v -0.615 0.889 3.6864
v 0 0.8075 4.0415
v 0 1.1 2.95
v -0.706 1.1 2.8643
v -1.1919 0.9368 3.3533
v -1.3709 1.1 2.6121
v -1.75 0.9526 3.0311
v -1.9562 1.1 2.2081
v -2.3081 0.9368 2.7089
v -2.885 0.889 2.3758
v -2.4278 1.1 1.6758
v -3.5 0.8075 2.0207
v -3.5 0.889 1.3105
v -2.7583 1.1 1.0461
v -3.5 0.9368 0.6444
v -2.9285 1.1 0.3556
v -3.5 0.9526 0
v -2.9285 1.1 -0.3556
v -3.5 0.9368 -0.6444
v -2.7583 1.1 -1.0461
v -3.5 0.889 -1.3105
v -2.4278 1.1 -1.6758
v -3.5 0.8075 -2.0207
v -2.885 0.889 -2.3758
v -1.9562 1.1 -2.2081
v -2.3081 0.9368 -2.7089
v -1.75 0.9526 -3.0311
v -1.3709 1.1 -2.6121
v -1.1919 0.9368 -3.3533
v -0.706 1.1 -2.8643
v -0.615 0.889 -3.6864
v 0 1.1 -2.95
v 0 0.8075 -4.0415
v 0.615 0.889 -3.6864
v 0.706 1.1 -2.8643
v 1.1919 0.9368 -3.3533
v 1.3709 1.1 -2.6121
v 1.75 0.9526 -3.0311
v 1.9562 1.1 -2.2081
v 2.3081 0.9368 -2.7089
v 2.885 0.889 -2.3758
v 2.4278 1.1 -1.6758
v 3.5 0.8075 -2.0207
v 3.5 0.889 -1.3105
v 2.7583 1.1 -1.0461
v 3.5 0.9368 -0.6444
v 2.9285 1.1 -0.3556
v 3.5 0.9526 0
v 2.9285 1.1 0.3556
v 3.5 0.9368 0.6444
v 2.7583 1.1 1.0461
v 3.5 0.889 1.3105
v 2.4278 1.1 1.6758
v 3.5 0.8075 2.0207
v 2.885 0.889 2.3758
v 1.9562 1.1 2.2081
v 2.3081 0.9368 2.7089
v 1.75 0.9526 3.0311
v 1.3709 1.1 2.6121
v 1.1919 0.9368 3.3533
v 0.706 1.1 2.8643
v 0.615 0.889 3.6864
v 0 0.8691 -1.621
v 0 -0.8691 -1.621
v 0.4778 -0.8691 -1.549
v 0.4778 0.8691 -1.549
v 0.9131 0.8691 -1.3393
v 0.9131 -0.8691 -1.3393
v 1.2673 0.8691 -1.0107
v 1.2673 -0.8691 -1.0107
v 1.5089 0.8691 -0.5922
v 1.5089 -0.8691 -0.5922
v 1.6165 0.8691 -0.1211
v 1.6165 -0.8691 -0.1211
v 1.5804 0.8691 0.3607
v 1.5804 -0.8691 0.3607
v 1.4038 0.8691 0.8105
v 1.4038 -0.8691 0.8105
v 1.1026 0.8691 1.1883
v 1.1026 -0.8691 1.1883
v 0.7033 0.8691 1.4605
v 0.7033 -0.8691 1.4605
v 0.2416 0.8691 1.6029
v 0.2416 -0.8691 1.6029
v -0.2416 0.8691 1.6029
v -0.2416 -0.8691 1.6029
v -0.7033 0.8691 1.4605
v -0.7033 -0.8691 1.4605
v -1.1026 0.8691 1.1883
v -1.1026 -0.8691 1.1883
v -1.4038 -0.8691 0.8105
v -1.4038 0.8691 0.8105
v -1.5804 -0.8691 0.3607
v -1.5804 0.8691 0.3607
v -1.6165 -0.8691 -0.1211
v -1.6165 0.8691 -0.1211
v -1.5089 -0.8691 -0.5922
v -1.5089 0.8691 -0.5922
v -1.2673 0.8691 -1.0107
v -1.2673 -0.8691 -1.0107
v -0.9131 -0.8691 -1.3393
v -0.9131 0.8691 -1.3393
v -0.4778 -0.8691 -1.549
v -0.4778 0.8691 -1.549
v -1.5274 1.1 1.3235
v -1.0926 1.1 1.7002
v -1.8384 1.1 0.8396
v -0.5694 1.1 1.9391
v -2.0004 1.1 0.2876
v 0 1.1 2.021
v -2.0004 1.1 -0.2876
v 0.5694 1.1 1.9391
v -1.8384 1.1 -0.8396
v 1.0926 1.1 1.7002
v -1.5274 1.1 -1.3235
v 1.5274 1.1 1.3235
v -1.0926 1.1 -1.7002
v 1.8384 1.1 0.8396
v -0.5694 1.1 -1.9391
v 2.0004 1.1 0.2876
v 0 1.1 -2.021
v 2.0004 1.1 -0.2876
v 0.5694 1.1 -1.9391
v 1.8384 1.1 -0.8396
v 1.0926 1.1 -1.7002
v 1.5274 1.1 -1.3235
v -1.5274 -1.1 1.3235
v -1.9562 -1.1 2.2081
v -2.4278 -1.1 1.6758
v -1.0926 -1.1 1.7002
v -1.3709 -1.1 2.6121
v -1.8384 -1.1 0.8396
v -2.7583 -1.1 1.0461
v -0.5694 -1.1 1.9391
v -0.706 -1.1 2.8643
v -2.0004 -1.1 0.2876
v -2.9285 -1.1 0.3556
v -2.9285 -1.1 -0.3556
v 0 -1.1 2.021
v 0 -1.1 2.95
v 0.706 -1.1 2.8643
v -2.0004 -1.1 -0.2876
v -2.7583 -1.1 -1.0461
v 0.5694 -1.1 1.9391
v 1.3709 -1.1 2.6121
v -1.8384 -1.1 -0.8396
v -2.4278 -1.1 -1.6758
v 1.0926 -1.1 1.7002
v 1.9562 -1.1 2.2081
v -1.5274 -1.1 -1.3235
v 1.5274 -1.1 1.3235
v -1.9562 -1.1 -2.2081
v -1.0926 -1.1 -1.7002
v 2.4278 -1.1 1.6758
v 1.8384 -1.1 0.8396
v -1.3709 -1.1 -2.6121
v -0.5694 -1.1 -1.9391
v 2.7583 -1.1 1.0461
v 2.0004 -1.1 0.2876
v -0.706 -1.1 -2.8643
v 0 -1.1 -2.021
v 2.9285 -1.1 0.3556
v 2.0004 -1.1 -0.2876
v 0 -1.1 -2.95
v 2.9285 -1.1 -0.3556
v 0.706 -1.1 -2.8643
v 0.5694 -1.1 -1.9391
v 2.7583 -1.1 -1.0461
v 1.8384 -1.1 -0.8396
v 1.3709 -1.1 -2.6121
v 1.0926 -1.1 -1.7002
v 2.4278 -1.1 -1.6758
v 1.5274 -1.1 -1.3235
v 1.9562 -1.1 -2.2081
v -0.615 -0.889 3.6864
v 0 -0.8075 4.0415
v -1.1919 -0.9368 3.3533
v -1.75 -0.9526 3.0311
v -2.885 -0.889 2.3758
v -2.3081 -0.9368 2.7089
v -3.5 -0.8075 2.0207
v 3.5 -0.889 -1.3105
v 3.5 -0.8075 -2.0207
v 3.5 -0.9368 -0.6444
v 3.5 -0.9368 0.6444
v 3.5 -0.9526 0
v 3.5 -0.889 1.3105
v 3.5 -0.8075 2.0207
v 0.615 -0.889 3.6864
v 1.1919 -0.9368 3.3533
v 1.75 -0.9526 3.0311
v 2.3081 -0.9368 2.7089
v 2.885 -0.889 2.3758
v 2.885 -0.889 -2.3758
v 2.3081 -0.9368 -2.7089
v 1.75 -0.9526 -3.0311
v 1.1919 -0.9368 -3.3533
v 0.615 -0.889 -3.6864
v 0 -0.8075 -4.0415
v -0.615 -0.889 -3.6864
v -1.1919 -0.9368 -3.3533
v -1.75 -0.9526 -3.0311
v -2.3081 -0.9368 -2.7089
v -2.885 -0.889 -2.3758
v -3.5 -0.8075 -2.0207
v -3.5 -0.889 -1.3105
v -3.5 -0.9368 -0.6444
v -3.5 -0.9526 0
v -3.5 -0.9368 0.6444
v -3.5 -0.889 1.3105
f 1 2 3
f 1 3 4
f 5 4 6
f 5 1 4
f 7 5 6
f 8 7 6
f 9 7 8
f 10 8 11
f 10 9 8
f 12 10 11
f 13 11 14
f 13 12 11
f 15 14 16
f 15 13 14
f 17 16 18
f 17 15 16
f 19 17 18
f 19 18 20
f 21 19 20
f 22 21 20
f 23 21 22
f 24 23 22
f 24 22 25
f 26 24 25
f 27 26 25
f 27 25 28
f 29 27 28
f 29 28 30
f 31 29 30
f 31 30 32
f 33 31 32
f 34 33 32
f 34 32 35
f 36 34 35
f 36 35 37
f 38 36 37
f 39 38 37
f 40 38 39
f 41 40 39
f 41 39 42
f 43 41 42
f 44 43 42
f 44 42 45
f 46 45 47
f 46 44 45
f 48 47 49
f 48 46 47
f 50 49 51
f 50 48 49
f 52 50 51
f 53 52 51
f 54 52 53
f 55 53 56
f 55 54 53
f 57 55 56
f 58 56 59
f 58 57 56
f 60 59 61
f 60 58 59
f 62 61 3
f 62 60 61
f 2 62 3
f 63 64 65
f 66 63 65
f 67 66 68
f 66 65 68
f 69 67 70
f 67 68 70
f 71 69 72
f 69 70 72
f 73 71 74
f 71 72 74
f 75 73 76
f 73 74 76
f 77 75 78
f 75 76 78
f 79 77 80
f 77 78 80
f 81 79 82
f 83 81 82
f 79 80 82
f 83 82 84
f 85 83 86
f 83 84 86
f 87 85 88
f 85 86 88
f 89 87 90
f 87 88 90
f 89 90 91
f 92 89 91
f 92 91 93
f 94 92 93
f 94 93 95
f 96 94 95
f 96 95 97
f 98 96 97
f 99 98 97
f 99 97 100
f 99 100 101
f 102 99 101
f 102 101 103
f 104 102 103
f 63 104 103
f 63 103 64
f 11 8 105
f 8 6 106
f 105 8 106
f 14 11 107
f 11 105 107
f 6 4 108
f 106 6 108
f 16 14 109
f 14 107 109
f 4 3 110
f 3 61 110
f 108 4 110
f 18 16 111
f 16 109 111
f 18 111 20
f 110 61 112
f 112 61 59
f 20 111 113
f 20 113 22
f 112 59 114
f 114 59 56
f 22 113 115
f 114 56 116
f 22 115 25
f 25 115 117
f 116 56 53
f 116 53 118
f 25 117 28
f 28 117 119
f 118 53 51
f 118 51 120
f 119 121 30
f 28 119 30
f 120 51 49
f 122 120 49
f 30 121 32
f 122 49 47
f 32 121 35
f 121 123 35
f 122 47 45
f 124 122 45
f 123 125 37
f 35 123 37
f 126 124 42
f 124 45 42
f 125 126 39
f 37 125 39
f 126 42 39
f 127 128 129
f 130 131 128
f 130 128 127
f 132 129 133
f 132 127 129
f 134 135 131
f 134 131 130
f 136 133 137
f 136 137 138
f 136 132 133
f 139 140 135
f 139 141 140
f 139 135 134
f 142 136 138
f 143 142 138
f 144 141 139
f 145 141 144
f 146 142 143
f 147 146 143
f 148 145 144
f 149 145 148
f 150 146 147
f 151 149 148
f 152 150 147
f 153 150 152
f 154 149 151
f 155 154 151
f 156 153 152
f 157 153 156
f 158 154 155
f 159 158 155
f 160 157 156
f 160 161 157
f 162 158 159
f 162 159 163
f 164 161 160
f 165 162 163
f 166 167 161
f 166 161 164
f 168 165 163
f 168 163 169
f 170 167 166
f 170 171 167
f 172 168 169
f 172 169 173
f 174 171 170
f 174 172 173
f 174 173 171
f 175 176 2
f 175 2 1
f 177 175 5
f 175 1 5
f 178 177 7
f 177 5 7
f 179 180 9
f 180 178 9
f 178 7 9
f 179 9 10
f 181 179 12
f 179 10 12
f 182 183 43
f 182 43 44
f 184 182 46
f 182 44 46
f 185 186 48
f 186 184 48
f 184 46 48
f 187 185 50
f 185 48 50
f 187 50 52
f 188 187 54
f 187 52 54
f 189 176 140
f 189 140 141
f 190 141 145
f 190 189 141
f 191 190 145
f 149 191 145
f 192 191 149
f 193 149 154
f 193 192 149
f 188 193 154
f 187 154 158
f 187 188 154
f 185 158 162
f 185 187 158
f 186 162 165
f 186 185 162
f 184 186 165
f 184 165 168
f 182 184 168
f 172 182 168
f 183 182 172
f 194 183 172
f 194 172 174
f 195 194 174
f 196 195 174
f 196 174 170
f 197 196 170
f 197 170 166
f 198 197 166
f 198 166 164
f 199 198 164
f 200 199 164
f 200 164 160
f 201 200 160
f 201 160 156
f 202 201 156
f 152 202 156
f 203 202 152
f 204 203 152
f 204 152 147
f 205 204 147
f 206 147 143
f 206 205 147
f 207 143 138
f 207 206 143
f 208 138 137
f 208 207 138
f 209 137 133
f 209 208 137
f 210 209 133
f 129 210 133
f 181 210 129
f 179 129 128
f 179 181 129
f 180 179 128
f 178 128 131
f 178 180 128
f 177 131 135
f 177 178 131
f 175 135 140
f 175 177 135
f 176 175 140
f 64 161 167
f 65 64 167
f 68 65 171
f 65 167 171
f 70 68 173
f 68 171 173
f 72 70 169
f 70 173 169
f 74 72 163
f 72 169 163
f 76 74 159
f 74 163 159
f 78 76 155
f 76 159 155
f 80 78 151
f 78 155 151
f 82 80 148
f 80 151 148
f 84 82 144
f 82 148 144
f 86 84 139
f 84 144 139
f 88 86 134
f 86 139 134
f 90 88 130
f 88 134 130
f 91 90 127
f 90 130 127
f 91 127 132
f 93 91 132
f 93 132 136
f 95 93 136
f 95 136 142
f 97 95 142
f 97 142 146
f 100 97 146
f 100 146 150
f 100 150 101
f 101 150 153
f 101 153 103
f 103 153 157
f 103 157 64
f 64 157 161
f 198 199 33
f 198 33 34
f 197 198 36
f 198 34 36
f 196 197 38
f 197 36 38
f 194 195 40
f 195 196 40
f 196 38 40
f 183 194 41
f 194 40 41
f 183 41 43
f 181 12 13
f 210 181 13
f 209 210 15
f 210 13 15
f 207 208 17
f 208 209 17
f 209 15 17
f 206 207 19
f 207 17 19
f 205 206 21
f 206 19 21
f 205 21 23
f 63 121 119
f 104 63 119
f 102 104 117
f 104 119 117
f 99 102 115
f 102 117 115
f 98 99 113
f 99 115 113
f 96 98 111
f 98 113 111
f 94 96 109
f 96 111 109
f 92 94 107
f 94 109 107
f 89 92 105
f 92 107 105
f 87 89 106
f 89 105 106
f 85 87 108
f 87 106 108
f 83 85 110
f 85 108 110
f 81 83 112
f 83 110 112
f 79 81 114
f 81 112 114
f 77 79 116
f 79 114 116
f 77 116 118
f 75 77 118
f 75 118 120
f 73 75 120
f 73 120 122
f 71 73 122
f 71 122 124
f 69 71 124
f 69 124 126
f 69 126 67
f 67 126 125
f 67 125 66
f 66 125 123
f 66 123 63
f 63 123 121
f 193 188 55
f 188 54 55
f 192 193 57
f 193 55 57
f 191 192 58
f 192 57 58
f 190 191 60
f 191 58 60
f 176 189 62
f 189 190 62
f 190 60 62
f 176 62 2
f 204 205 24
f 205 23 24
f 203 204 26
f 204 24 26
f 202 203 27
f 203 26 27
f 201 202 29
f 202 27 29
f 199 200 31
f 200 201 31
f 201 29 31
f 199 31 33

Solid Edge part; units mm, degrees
sketch "Sketch1" plane through (0, 0, 0) normal (0, -1, 0) x (1, 0, 0)
  line L0 (3.5, 2.0207) -> (0, 4.0415)
  line L1 (0, 4.0415) -> (-3.5, 2.0207)
  line L2 (-3.5, 2.0207) -> (-3.5, -2.0207)
  line L3 (-3.5, -2.0207) -> (0, -4.0415)
  line L4 (0, -4.0415) -> (3.5, -2.0207)
  line L5 (3.5, -2.0207) -> (3.5, 2.0207)
extrude "Protrusion1" add sketch "Sketch1" along normal mid plane 2.2
sketch "Sketch2" plane through (0, 0, 0) normal (1, 0, 0) x (0, 1, 0)
  line L0 (-1.1, 2.95) -> (-0.8075, 4.0415)
revolve "RevolvedCutout1" cut sketch "Sketch2" angle 360 about axis through (0, 0, 0) along (0, -1, 0) material side at (0, -1.002, 3.5087)
mirror "Mirror1" about plane through (0, 0, 0) normal (0, -1, 0) of "RevolvedCutout1"
hole "孔_7" at (0, -1.1, 0) direction (0, 1, 0) diameter 3.242 end up to next start chamfer 0.4 start chamfer angle 60 end chamfer 0.4 end chamfer angle 60
